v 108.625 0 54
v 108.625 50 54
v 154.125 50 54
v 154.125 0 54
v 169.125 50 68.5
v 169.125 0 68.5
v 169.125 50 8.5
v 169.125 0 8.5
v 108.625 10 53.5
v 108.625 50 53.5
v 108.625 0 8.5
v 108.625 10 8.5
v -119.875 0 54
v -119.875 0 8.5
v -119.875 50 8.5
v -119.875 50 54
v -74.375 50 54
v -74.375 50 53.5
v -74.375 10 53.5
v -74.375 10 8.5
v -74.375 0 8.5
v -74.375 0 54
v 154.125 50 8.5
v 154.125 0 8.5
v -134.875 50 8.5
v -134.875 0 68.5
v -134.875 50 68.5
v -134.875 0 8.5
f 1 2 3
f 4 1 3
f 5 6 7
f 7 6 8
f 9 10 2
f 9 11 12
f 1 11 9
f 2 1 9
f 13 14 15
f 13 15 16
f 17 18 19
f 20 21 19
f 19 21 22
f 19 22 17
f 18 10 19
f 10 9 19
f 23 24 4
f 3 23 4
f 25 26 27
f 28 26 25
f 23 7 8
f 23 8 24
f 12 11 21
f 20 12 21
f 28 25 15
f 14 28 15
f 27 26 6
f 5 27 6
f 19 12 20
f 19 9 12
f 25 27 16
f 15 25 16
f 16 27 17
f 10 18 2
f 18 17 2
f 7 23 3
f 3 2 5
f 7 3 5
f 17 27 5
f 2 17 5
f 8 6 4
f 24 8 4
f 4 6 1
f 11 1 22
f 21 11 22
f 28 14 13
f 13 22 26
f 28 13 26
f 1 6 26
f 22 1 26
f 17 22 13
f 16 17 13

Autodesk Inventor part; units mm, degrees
ref_plane "YZ Plane" through (0, 0, 0) normal (1, 0, 0) x (0, 1, 0)
ref_plane "XZ Plane" through (0, 0, 0) normal (0, 1, 0) x (-1, 0, 0)
ref_plane "XY Plane" through (0, 0, 0) normal (0, 0, 1) x (1, 0, 0)
sketch "Sketch1" plane through (0, 0, 0) normal (0, 1, 0) x (-1, 0, 0)
  line L0 (119.875, 68.5) -> (-154.125, 68.5)
  line L1 (-154.125, 68.5) -> (-154.125, 8.5)
  line L2 (-154.125, 8.5) -> (119.875, 8.5)
  line L3 (119.875, 8.5) -> (119.875, 68.5)
  point P0 (0, 0)
  dimension "d0" = 274
  dimension "d1" = 60
extrude "Extrusion1" add sketch "Sketch1" along normal blind 10
sketch "Sketch2" plane through (0, 10, 0) normal (0, 1, 0) x (1, 0, 0)
  line L0 (-119.875, -8.5) -> (-119.875, -68.5) projected
  line L1 (-119.875, -68.5) -> (154.125, -68.5)
  line L2 (154.125, -68.5) -> (154.125, -53.5)
  line L3 (154.125, -53.5) -> (-119.875, -53.5)
  line L4 (-119.875, -53.5) -> (-119.875, -68.5)
  line L5 (154.125, -68.5) -> (154.125, -8.5) projected
  line L6 (154.125, -8.5) -> (-119.875, -8.5) projected
  line L7 (-119.875, -8.5) -> (-119.875, -68.5) projected
  line L8 (-119.875, -68.5) -> (154.125, -68.5) projected
  point P0 (0, 0)
  dimension "d4" = 15
extrude "Extrusion2" add sketch "Sketch2" along normal blind 50 contours L3 L2 L1 L0
sketch "Sketch3" plane through (0, 10, 0) normal (0, 1, 0) x (1, 0, 0)
  line L0 (154.125, -8.5) -> (108.625, -8.5)
  line L1 (108.625, -8.5) -> (108.625, -54)
  line L2 (108.625, -54) -> (154.125, -54)
  line L3 (154.125, -54) -> (154.125, -8.5)
  line L4 (-119.875, -8.5) -> (-119.875, -68.5) projected
  line L5 (-119.875, -8.5) -> (-74.375, -8.5)
  line L6 (-74.375, -8.5) -> (-74.375, -54)
  line L7 (-74.375, -54) -> (-119.875, -54)
  line L8 (-119.875, -54) -> (-119.875, -8.5)
  point P0 (0, 0)
  dimension "d7" = 45.5
  dimension "d8" = 45.5
extrude "Extrusion3" cut sketch "Sketch3" along normal mid plane 150
sketch "Sketch4" plane through (0, 0, 0) normal (0, -1, 0) x (1, 0, 0)
  line L0 (-74.375, 54) -> (-74.375, 8.5) projected
  line L1 (108.625, 8.5) -> (-74.375, 8.5) projected
  line L2 (108.625, 8.5) -> (108.625, 54) projected
  line L3 (108.625, 54) -> (154.125, 54) projected
  line L4 (154.125, 68.5) -> (154.125, 54) projected
  line L5 (-119.875, 68.5) -> (154.125, 68.5) projected
  line L6 (-119.875, 54) -> (-119.875, 68.5) projected
  line L7 (-119.875, 54) -> (-74.375, 54) projected
  line L8 (-119.875, 68.5) -> (-134.875, 68.5)
  line L9 (-134.875, 68.5) -> (-134.875, 8.5)
  line L10 (-134.875, 8.5) -> (-119.875, 8.5)
  line L11 (-119.875, 8.5) -> (-119.875, 68.5)
  line L12 (154.125, 68.5) -> (169.125, 68.5)
  line L13 (169.125, 68.5) -> (169.125, 8.5)
  line L14 (169.125, 8.5) -> (154.125, 8.5)
  line L15 (154.125, 8.5) -> (154.125, 68.5)
  point P0 (0, 0)
  dimension "d11" = 60
  dimension "d12" = 60
  dimension "d13" = 15
  dimension "d14" = 15
extrude "Extrusion4" add sketch "Sketch4" against normal blind 50 contours L11 L10 L9 L8 L6 | L12 L13 L14 L15 L4
sketch "Sketch5" plane through (0, 60, 0) normal (0, 1, 0) x (1, 0, 0)
  line L0 (-140, -80) -> (185, -80)
  line L1 (185, -80) -> (185, 19)
  line L2 (185, 19) -> (-140, 19)
  line L3 (-140, 19) -> (-140, -80)
  point P0 (0, 0)
extrude "Extrusion5" cut sketch "Sketch5" against normal up to surface (10 mm away)
properties part number "VerticalAxis"
